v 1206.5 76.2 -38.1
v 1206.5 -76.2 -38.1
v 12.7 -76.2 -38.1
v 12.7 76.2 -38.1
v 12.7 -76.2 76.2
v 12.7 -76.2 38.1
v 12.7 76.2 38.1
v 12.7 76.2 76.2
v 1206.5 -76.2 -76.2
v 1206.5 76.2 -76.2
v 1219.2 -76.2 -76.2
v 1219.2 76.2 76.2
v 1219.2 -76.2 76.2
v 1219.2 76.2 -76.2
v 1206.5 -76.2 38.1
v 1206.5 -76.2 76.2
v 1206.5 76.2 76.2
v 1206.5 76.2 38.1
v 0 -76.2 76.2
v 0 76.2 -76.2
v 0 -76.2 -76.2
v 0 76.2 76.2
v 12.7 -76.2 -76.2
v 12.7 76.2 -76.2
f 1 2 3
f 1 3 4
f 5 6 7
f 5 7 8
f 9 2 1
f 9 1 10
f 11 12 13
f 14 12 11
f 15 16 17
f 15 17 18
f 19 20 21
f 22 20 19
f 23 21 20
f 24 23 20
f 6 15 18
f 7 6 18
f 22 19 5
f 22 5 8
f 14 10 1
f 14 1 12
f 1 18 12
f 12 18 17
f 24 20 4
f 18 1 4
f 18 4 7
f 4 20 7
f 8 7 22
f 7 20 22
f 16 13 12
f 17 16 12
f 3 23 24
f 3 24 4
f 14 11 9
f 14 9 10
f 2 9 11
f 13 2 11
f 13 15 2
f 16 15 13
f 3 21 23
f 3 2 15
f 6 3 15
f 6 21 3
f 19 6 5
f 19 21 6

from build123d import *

# Parameters (mm, degrees)
SKETCH1_W           = 76.2
SKETCH1_H           = 152.4
BOSS_EXTRUDE1_DEPTH = 1219.2
SKETCH2_W           = 152.4
SKETCH2_H           = 152.4
BOSS_EXTRUDE2_DEPTH = 12.7
SKETCH3_W           = 152.4
SKETCH3_H           = 152.4
BOSS_EXTRUDE3_DEPTH = 12.7


with BuildPart() as part:
    # Sketch1 → Boss-Extrude1 (new body)
    with BuildSketch(Plane(origin=(0, 0, 0), x_dir=(0, 0, -1), z_dir=(1, 0, 0))):
        Rectangle(SKETCH1_W, SKETCH1_H)
    extrude(amount=BOSS_EXTRUDE1_DEPTH)

    # Sketch2 → Boss-Extrude2 (add)
    with BuildSketch(Plane(origin=(1219.2, 0, 0), x_dir=(0, 0, -1), z_dir=(1, 0, 0))):
        Rectangle(SKETCH2_W, SKETCH2_H)
    extrude(amount=-BOSS_EXTRUDE2_DEPTH)

    # Sketch3 → Boss-Extrude3 (add)
    with BuildSketch(Plane.ZY):
        Rectangle(SKETCH3_W, SKETCH3_H)
    extrude(amount=-BOSS_EXTRUDE3_DEPTH)


solid = part.part
